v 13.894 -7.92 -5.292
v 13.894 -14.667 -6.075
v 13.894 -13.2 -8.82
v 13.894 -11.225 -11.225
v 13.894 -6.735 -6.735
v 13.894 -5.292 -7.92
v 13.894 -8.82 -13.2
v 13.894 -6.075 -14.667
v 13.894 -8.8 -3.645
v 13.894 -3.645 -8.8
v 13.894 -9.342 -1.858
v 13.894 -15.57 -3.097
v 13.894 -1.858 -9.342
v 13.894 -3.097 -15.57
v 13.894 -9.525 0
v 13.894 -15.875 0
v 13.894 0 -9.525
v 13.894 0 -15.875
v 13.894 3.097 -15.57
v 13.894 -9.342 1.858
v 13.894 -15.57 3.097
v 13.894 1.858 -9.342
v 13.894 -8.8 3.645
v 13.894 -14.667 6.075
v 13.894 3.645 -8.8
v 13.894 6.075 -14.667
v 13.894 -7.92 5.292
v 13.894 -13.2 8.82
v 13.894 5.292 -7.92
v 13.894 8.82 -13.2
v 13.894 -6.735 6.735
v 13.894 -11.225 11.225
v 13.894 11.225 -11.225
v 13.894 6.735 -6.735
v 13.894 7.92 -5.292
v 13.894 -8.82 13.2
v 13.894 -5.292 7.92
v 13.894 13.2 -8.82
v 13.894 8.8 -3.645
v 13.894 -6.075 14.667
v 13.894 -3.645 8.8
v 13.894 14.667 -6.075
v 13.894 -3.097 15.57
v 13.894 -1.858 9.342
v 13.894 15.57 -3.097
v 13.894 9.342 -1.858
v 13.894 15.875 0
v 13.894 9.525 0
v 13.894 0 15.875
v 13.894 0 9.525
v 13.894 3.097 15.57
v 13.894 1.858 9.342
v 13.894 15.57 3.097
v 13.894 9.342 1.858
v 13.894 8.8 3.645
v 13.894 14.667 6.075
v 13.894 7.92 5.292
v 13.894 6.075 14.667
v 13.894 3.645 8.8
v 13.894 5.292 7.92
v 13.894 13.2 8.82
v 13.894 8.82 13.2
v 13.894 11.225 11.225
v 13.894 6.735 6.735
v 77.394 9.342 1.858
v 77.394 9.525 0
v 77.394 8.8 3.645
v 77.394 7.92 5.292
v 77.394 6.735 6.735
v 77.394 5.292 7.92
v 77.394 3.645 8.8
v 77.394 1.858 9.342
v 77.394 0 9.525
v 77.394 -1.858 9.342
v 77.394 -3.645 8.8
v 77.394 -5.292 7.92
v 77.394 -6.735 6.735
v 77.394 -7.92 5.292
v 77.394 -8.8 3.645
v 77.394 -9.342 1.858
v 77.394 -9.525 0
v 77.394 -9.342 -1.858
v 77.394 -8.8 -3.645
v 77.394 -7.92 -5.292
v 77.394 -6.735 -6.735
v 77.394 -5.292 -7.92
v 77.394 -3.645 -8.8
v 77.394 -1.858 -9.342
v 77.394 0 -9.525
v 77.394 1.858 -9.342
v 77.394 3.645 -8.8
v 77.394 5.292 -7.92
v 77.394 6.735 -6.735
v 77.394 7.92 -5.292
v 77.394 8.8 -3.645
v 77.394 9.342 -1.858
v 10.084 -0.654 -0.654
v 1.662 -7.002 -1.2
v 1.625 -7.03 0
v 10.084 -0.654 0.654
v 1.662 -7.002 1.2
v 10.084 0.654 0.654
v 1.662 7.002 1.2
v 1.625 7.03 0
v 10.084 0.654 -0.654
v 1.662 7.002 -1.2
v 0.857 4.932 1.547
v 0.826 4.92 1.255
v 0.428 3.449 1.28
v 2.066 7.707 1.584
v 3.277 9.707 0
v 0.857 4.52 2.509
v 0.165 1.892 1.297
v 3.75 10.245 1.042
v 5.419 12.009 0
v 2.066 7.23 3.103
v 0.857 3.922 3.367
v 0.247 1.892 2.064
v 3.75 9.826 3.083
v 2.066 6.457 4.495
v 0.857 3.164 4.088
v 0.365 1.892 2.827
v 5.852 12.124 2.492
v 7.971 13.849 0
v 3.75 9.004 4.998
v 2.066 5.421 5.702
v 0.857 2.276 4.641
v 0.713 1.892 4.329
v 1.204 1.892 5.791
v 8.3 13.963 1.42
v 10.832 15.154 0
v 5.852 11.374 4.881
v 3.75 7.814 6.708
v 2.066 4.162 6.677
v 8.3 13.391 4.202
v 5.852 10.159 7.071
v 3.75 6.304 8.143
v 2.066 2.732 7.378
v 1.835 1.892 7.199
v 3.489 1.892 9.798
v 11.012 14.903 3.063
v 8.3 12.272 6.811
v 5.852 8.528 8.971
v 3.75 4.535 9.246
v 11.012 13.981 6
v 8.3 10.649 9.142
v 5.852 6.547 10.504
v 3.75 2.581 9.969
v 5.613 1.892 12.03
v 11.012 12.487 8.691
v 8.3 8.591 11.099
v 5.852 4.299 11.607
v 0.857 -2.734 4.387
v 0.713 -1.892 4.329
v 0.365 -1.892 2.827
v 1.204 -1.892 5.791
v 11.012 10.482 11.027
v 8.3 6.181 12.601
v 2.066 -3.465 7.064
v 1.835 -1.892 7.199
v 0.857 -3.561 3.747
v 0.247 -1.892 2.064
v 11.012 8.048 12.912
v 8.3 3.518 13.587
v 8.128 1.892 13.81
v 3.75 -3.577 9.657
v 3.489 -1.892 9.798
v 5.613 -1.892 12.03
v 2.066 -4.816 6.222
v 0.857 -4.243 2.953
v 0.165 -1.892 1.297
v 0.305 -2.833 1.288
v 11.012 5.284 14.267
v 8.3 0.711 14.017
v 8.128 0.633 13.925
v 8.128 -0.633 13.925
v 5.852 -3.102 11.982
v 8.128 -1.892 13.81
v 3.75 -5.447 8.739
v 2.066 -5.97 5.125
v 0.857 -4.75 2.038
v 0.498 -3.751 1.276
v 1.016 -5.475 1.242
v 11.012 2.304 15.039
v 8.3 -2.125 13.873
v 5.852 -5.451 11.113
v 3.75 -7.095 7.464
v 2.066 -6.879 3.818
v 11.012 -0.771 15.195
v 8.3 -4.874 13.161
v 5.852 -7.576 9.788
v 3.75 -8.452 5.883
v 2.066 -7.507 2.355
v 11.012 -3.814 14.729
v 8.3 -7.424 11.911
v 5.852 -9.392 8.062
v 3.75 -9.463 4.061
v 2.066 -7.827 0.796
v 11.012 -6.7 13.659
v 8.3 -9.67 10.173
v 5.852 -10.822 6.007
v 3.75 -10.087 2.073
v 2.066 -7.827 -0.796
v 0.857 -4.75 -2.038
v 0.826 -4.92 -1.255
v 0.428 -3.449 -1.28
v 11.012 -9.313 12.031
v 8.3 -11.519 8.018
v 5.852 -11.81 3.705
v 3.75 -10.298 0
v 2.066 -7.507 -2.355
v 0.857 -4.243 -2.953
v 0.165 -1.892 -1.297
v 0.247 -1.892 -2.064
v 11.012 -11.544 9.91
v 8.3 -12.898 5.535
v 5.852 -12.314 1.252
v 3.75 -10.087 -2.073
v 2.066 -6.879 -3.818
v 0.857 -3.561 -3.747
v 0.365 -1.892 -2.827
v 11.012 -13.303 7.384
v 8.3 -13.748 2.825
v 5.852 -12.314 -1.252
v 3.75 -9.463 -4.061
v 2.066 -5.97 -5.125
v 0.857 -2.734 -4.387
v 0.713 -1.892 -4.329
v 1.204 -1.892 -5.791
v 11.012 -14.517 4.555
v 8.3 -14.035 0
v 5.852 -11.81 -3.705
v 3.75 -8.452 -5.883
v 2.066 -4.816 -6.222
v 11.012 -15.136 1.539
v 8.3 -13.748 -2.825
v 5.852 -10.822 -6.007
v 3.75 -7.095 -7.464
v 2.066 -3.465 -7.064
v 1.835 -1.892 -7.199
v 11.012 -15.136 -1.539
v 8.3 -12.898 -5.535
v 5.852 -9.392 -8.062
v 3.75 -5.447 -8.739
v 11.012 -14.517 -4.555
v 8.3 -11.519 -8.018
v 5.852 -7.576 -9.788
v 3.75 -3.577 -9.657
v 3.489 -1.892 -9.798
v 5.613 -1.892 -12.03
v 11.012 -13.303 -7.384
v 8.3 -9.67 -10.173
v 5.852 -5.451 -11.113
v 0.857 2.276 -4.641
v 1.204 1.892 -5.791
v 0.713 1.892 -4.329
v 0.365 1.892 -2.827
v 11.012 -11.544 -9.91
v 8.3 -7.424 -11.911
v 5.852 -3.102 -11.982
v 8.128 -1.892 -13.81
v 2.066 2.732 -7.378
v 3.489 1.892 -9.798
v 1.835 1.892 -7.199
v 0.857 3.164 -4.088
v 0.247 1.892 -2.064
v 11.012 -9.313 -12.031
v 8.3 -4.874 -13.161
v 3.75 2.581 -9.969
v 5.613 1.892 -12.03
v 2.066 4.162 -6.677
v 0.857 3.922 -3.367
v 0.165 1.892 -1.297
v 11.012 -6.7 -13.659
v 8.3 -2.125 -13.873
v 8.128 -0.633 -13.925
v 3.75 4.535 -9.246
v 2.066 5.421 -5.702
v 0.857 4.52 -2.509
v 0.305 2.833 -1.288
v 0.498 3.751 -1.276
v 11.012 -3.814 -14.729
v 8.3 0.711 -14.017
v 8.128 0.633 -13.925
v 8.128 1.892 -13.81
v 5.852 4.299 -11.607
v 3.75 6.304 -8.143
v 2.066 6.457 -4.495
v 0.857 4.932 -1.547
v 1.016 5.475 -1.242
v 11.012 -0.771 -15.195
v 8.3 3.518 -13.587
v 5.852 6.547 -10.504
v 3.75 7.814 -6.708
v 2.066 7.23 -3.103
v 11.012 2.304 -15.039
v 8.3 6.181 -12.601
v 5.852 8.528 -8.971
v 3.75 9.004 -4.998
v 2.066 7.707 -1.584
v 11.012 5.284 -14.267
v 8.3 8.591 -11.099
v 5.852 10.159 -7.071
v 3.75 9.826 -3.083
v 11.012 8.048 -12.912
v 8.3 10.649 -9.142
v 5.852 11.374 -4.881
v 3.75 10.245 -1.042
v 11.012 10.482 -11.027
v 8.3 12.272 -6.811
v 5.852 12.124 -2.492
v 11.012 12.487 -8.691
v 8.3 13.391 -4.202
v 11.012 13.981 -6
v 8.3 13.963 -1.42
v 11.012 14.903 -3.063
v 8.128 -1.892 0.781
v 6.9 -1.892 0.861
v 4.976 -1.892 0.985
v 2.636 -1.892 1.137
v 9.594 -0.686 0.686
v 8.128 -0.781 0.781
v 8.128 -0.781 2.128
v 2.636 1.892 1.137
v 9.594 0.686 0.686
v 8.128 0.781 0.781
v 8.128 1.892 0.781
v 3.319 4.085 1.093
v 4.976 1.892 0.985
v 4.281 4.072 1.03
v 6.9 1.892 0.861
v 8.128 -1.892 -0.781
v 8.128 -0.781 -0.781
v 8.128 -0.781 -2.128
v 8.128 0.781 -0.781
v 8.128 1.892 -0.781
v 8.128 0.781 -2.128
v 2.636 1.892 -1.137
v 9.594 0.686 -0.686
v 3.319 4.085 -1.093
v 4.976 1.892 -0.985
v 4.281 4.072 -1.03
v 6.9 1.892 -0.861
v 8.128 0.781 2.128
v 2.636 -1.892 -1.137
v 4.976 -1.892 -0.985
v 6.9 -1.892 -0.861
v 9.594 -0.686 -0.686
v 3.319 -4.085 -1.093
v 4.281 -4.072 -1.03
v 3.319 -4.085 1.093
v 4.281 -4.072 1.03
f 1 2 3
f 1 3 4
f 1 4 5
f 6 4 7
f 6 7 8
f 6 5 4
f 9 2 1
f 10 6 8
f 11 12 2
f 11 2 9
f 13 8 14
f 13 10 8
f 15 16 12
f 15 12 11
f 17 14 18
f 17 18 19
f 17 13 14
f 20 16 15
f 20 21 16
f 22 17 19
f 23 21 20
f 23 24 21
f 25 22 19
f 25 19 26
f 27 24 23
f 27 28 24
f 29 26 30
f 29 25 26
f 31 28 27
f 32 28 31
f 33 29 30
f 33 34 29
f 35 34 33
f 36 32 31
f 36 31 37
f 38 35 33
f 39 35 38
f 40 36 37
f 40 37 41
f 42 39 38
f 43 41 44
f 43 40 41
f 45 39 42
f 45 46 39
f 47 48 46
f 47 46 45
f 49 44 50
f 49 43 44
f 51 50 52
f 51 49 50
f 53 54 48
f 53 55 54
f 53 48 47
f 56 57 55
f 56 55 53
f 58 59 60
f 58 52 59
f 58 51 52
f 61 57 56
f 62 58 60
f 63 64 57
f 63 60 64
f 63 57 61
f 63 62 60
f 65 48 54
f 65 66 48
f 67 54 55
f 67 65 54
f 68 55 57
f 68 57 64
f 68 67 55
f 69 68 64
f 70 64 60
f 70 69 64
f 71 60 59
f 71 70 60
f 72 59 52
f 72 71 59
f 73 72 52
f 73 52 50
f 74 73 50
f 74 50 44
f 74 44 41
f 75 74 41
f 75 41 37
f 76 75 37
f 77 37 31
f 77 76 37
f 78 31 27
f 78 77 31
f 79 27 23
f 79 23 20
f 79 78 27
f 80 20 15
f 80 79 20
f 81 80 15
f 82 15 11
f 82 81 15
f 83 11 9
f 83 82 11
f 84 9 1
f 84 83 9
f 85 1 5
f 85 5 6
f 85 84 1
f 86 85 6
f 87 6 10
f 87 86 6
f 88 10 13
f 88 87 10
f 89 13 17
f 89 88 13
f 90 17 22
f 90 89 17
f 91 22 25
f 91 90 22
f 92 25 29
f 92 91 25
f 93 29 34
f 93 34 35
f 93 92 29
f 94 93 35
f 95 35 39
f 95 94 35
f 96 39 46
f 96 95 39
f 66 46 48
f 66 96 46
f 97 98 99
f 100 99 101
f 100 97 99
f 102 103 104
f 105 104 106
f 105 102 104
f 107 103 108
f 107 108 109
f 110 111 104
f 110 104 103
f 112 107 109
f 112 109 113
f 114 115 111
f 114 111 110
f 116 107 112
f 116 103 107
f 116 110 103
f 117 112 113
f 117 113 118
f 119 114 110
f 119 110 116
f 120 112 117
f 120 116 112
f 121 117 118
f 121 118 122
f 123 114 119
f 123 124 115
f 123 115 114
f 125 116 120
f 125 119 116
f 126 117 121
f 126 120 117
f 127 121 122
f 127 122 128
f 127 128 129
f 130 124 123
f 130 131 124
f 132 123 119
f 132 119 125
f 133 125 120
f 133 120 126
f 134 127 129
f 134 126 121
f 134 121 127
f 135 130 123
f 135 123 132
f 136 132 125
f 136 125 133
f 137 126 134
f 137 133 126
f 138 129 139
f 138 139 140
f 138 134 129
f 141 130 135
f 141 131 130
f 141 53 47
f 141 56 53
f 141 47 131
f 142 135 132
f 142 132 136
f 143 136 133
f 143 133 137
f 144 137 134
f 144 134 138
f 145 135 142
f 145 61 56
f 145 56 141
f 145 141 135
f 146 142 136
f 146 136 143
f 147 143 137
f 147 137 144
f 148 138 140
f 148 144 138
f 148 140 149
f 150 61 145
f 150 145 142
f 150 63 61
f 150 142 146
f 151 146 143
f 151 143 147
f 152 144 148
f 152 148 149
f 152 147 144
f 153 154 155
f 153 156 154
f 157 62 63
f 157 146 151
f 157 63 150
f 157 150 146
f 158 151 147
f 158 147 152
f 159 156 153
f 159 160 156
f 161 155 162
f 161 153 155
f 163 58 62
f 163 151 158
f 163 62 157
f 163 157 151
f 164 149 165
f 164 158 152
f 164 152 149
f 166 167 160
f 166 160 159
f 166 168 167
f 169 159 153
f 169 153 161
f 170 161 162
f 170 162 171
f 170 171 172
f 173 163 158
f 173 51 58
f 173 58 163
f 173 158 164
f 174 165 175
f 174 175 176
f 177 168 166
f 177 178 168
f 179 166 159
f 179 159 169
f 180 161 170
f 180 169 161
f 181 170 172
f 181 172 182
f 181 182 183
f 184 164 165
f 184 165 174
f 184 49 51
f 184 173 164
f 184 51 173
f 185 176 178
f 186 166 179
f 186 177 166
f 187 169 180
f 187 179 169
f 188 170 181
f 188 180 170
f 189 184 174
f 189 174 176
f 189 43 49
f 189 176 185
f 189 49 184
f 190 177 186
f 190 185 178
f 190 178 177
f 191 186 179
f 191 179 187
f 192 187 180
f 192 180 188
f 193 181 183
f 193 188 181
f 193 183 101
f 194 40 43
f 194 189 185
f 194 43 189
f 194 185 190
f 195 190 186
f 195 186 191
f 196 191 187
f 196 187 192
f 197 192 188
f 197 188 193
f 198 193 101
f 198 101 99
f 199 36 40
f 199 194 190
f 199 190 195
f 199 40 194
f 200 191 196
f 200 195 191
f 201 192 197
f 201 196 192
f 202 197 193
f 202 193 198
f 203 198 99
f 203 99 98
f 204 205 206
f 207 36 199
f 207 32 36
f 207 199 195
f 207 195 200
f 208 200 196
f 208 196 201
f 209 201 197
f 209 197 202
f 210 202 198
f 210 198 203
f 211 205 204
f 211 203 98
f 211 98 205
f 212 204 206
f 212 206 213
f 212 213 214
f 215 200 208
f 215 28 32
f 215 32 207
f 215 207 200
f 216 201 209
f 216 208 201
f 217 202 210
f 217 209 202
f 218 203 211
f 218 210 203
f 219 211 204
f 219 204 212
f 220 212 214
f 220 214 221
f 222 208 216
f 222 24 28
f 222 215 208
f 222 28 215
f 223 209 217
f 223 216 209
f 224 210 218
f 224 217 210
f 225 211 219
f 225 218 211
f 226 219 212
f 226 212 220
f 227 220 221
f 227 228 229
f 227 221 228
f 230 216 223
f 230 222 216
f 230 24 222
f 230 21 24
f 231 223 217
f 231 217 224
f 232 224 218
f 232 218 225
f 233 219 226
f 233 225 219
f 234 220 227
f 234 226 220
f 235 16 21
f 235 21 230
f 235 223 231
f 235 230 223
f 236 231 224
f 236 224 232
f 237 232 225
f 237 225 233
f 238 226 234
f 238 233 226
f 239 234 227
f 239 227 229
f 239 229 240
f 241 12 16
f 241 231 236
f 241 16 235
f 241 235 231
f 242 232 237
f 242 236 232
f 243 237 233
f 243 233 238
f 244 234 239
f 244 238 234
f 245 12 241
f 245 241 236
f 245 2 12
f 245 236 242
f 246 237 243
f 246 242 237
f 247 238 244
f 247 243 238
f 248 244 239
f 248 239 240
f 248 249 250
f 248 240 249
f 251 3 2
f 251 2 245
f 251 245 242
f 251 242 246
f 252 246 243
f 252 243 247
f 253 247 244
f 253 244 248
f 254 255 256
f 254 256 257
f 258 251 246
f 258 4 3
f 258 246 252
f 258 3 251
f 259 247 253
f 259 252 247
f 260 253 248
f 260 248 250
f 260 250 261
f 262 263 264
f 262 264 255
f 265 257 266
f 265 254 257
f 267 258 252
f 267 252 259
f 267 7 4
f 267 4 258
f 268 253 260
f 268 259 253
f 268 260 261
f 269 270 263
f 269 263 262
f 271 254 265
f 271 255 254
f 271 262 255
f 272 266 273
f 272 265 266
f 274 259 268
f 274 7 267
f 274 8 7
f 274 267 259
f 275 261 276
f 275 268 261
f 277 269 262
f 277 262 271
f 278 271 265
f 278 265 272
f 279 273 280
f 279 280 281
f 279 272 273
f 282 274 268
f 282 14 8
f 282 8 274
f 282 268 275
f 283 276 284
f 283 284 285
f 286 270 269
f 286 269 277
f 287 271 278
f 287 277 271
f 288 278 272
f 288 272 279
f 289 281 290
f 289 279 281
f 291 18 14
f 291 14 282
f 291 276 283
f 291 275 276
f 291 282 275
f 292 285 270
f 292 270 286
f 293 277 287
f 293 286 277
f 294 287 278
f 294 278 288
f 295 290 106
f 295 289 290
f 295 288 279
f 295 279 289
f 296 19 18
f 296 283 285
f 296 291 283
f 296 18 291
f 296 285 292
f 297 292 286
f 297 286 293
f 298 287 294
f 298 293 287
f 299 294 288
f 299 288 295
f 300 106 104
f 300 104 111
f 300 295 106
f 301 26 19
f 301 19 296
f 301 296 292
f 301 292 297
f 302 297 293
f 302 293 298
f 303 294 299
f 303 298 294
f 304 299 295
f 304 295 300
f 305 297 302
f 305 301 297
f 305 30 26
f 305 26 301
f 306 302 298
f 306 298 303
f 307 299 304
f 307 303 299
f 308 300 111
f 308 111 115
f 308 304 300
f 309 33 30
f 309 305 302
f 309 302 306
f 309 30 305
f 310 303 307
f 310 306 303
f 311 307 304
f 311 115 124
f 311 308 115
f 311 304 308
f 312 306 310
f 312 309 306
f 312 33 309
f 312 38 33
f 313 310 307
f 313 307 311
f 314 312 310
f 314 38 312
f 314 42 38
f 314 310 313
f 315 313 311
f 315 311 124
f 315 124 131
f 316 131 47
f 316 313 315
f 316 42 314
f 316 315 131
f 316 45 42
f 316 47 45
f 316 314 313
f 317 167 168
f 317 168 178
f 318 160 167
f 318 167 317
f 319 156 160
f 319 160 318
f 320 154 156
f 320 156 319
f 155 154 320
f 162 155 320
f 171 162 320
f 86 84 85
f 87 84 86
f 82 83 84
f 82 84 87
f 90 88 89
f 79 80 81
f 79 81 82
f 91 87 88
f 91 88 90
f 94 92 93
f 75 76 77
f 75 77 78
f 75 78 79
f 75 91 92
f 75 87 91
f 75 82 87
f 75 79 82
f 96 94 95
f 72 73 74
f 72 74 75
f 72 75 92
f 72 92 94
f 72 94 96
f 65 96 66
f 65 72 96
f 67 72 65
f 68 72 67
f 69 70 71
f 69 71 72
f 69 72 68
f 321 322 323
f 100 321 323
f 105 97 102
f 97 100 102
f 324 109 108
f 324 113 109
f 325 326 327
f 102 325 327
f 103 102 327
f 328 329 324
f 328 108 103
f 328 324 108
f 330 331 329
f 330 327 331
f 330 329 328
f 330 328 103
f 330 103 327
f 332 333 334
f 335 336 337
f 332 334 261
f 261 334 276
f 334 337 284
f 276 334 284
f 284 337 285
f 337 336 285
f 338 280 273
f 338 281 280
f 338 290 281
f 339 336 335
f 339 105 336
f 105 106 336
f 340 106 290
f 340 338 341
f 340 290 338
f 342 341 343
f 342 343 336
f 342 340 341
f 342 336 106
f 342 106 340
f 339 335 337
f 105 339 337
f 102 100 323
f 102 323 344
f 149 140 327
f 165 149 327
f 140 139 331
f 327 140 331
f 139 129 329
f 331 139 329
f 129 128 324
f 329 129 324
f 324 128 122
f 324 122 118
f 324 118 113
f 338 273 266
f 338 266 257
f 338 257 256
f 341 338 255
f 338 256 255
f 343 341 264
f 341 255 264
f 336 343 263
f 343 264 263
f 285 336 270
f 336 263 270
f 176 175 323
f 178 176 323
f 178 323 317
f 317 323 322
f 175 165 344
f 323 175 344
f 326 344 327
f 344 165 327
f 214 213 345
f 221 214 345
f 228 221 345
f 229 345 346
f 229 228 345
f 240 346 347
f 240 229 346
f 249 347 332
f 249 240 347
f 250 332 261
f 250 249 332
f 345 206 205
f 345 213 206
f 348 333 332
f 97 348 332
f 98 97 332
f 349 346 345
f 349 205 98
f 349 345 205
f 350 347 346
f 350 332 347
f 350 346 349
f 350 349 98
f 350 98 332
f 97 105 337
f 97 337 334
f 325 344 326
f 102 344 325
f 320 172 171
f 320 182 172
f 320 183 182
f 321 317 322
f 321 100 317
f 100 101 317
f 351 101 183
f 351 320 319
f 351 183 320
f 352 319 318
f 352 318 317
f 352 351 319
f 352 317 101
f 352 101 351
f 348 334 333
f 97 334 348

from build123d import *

# Parameters (mm, degrees)
SKETCH2_W         = 31.75
SKETCH2_H         = 3.7846
SLOT_DEPTH        = 8.128
CIRPATTERN1_COUNT = 2
CIRPATTERN1_ANGLE = 90


# Read off the part's stored shape, not the designer's step: ThreadSchematic
with BuildPart() as part:
    # ThreadSchematic outline → ThreadSchematic (revolve)
    with BuildSketch(Plane.YX):
        with BuildLine():
            Line((0, 77.3938), (0, 0))
            ThreePointArc((0, 0), (10.548143245, 3.963989534), (15.875000001, 13.893800008))
            Line((15.875000001, 13.893800008), (9.525, 13.8938))
            Line((9.525, 13.8938), (9.525, 77.3938))
            Line((9.525, 77.3938), (0, 77.3938))
        make_face()
    revolve(axis=Axis((0, 0, 0), (1, 0, 0)))

    # Sketch2 → Slot (cut)
    with BuildSketch(Plane(origin=(0, 0, 0), x_dir=(0, 0, -1), z_dir=(1, 0, 0))):
        Rectangle(SKETCH2_W, SKETCH2_H)
    extrude(amount=SLOT_DEPTH, mode=Mode.SUBTRACT)

    # Sketch3 → Cross section 0
    with BuildSketch(Plane(origin=(0, 0, 0), x_dir=(0, 0, -1), z_dir=(1, 0, 0))):
        with BuildLine():
            Line((1.3081, -8.255), (-1.3081, -8.255))
            Line((-1.3081, -8.255), (-1.3081, 8.255))
            Line((-1.3081, 8.255), (1.3081, 8.255))
            Line((1.3081, 8.255), (1.3081, -8.255))
        make_face()
    # Sketch4 → Cross section 1
    with BuildSketch(Plane(origin=(10.0838, 0, 0), x_dir=(0, 0, -1), z_dir=(1, 0, 0))):
        with BuildLine():
            Line((0.65405, -0.65405), (-0.65405, -0.65405))
            Line((-0.65405, -0.65405), (-0.65405, 0.65405))
            Line((-0.65405, 0.65405), (0.65405, 0.65405))
            Line((0.65405, 0.65405), (0.65405, -0.65405))
        make_face()
    cross = loft(mode=Mode.SUBTRACT)

    # CirPattern1: Cross ×2 about axis
    cirpattern1_axis = Axis((0, 0, 0), (1, 0, 0))
    for i in range(1, CIRPATTERN1_COUNT):
        add(cross.rotate(cirpattern1_axis, i * CIRPATTERN1_ANGLE / (CIRPATTERN1_COUNT - 1)), mode=Mode.SUBTRACT)


solid = part.part
